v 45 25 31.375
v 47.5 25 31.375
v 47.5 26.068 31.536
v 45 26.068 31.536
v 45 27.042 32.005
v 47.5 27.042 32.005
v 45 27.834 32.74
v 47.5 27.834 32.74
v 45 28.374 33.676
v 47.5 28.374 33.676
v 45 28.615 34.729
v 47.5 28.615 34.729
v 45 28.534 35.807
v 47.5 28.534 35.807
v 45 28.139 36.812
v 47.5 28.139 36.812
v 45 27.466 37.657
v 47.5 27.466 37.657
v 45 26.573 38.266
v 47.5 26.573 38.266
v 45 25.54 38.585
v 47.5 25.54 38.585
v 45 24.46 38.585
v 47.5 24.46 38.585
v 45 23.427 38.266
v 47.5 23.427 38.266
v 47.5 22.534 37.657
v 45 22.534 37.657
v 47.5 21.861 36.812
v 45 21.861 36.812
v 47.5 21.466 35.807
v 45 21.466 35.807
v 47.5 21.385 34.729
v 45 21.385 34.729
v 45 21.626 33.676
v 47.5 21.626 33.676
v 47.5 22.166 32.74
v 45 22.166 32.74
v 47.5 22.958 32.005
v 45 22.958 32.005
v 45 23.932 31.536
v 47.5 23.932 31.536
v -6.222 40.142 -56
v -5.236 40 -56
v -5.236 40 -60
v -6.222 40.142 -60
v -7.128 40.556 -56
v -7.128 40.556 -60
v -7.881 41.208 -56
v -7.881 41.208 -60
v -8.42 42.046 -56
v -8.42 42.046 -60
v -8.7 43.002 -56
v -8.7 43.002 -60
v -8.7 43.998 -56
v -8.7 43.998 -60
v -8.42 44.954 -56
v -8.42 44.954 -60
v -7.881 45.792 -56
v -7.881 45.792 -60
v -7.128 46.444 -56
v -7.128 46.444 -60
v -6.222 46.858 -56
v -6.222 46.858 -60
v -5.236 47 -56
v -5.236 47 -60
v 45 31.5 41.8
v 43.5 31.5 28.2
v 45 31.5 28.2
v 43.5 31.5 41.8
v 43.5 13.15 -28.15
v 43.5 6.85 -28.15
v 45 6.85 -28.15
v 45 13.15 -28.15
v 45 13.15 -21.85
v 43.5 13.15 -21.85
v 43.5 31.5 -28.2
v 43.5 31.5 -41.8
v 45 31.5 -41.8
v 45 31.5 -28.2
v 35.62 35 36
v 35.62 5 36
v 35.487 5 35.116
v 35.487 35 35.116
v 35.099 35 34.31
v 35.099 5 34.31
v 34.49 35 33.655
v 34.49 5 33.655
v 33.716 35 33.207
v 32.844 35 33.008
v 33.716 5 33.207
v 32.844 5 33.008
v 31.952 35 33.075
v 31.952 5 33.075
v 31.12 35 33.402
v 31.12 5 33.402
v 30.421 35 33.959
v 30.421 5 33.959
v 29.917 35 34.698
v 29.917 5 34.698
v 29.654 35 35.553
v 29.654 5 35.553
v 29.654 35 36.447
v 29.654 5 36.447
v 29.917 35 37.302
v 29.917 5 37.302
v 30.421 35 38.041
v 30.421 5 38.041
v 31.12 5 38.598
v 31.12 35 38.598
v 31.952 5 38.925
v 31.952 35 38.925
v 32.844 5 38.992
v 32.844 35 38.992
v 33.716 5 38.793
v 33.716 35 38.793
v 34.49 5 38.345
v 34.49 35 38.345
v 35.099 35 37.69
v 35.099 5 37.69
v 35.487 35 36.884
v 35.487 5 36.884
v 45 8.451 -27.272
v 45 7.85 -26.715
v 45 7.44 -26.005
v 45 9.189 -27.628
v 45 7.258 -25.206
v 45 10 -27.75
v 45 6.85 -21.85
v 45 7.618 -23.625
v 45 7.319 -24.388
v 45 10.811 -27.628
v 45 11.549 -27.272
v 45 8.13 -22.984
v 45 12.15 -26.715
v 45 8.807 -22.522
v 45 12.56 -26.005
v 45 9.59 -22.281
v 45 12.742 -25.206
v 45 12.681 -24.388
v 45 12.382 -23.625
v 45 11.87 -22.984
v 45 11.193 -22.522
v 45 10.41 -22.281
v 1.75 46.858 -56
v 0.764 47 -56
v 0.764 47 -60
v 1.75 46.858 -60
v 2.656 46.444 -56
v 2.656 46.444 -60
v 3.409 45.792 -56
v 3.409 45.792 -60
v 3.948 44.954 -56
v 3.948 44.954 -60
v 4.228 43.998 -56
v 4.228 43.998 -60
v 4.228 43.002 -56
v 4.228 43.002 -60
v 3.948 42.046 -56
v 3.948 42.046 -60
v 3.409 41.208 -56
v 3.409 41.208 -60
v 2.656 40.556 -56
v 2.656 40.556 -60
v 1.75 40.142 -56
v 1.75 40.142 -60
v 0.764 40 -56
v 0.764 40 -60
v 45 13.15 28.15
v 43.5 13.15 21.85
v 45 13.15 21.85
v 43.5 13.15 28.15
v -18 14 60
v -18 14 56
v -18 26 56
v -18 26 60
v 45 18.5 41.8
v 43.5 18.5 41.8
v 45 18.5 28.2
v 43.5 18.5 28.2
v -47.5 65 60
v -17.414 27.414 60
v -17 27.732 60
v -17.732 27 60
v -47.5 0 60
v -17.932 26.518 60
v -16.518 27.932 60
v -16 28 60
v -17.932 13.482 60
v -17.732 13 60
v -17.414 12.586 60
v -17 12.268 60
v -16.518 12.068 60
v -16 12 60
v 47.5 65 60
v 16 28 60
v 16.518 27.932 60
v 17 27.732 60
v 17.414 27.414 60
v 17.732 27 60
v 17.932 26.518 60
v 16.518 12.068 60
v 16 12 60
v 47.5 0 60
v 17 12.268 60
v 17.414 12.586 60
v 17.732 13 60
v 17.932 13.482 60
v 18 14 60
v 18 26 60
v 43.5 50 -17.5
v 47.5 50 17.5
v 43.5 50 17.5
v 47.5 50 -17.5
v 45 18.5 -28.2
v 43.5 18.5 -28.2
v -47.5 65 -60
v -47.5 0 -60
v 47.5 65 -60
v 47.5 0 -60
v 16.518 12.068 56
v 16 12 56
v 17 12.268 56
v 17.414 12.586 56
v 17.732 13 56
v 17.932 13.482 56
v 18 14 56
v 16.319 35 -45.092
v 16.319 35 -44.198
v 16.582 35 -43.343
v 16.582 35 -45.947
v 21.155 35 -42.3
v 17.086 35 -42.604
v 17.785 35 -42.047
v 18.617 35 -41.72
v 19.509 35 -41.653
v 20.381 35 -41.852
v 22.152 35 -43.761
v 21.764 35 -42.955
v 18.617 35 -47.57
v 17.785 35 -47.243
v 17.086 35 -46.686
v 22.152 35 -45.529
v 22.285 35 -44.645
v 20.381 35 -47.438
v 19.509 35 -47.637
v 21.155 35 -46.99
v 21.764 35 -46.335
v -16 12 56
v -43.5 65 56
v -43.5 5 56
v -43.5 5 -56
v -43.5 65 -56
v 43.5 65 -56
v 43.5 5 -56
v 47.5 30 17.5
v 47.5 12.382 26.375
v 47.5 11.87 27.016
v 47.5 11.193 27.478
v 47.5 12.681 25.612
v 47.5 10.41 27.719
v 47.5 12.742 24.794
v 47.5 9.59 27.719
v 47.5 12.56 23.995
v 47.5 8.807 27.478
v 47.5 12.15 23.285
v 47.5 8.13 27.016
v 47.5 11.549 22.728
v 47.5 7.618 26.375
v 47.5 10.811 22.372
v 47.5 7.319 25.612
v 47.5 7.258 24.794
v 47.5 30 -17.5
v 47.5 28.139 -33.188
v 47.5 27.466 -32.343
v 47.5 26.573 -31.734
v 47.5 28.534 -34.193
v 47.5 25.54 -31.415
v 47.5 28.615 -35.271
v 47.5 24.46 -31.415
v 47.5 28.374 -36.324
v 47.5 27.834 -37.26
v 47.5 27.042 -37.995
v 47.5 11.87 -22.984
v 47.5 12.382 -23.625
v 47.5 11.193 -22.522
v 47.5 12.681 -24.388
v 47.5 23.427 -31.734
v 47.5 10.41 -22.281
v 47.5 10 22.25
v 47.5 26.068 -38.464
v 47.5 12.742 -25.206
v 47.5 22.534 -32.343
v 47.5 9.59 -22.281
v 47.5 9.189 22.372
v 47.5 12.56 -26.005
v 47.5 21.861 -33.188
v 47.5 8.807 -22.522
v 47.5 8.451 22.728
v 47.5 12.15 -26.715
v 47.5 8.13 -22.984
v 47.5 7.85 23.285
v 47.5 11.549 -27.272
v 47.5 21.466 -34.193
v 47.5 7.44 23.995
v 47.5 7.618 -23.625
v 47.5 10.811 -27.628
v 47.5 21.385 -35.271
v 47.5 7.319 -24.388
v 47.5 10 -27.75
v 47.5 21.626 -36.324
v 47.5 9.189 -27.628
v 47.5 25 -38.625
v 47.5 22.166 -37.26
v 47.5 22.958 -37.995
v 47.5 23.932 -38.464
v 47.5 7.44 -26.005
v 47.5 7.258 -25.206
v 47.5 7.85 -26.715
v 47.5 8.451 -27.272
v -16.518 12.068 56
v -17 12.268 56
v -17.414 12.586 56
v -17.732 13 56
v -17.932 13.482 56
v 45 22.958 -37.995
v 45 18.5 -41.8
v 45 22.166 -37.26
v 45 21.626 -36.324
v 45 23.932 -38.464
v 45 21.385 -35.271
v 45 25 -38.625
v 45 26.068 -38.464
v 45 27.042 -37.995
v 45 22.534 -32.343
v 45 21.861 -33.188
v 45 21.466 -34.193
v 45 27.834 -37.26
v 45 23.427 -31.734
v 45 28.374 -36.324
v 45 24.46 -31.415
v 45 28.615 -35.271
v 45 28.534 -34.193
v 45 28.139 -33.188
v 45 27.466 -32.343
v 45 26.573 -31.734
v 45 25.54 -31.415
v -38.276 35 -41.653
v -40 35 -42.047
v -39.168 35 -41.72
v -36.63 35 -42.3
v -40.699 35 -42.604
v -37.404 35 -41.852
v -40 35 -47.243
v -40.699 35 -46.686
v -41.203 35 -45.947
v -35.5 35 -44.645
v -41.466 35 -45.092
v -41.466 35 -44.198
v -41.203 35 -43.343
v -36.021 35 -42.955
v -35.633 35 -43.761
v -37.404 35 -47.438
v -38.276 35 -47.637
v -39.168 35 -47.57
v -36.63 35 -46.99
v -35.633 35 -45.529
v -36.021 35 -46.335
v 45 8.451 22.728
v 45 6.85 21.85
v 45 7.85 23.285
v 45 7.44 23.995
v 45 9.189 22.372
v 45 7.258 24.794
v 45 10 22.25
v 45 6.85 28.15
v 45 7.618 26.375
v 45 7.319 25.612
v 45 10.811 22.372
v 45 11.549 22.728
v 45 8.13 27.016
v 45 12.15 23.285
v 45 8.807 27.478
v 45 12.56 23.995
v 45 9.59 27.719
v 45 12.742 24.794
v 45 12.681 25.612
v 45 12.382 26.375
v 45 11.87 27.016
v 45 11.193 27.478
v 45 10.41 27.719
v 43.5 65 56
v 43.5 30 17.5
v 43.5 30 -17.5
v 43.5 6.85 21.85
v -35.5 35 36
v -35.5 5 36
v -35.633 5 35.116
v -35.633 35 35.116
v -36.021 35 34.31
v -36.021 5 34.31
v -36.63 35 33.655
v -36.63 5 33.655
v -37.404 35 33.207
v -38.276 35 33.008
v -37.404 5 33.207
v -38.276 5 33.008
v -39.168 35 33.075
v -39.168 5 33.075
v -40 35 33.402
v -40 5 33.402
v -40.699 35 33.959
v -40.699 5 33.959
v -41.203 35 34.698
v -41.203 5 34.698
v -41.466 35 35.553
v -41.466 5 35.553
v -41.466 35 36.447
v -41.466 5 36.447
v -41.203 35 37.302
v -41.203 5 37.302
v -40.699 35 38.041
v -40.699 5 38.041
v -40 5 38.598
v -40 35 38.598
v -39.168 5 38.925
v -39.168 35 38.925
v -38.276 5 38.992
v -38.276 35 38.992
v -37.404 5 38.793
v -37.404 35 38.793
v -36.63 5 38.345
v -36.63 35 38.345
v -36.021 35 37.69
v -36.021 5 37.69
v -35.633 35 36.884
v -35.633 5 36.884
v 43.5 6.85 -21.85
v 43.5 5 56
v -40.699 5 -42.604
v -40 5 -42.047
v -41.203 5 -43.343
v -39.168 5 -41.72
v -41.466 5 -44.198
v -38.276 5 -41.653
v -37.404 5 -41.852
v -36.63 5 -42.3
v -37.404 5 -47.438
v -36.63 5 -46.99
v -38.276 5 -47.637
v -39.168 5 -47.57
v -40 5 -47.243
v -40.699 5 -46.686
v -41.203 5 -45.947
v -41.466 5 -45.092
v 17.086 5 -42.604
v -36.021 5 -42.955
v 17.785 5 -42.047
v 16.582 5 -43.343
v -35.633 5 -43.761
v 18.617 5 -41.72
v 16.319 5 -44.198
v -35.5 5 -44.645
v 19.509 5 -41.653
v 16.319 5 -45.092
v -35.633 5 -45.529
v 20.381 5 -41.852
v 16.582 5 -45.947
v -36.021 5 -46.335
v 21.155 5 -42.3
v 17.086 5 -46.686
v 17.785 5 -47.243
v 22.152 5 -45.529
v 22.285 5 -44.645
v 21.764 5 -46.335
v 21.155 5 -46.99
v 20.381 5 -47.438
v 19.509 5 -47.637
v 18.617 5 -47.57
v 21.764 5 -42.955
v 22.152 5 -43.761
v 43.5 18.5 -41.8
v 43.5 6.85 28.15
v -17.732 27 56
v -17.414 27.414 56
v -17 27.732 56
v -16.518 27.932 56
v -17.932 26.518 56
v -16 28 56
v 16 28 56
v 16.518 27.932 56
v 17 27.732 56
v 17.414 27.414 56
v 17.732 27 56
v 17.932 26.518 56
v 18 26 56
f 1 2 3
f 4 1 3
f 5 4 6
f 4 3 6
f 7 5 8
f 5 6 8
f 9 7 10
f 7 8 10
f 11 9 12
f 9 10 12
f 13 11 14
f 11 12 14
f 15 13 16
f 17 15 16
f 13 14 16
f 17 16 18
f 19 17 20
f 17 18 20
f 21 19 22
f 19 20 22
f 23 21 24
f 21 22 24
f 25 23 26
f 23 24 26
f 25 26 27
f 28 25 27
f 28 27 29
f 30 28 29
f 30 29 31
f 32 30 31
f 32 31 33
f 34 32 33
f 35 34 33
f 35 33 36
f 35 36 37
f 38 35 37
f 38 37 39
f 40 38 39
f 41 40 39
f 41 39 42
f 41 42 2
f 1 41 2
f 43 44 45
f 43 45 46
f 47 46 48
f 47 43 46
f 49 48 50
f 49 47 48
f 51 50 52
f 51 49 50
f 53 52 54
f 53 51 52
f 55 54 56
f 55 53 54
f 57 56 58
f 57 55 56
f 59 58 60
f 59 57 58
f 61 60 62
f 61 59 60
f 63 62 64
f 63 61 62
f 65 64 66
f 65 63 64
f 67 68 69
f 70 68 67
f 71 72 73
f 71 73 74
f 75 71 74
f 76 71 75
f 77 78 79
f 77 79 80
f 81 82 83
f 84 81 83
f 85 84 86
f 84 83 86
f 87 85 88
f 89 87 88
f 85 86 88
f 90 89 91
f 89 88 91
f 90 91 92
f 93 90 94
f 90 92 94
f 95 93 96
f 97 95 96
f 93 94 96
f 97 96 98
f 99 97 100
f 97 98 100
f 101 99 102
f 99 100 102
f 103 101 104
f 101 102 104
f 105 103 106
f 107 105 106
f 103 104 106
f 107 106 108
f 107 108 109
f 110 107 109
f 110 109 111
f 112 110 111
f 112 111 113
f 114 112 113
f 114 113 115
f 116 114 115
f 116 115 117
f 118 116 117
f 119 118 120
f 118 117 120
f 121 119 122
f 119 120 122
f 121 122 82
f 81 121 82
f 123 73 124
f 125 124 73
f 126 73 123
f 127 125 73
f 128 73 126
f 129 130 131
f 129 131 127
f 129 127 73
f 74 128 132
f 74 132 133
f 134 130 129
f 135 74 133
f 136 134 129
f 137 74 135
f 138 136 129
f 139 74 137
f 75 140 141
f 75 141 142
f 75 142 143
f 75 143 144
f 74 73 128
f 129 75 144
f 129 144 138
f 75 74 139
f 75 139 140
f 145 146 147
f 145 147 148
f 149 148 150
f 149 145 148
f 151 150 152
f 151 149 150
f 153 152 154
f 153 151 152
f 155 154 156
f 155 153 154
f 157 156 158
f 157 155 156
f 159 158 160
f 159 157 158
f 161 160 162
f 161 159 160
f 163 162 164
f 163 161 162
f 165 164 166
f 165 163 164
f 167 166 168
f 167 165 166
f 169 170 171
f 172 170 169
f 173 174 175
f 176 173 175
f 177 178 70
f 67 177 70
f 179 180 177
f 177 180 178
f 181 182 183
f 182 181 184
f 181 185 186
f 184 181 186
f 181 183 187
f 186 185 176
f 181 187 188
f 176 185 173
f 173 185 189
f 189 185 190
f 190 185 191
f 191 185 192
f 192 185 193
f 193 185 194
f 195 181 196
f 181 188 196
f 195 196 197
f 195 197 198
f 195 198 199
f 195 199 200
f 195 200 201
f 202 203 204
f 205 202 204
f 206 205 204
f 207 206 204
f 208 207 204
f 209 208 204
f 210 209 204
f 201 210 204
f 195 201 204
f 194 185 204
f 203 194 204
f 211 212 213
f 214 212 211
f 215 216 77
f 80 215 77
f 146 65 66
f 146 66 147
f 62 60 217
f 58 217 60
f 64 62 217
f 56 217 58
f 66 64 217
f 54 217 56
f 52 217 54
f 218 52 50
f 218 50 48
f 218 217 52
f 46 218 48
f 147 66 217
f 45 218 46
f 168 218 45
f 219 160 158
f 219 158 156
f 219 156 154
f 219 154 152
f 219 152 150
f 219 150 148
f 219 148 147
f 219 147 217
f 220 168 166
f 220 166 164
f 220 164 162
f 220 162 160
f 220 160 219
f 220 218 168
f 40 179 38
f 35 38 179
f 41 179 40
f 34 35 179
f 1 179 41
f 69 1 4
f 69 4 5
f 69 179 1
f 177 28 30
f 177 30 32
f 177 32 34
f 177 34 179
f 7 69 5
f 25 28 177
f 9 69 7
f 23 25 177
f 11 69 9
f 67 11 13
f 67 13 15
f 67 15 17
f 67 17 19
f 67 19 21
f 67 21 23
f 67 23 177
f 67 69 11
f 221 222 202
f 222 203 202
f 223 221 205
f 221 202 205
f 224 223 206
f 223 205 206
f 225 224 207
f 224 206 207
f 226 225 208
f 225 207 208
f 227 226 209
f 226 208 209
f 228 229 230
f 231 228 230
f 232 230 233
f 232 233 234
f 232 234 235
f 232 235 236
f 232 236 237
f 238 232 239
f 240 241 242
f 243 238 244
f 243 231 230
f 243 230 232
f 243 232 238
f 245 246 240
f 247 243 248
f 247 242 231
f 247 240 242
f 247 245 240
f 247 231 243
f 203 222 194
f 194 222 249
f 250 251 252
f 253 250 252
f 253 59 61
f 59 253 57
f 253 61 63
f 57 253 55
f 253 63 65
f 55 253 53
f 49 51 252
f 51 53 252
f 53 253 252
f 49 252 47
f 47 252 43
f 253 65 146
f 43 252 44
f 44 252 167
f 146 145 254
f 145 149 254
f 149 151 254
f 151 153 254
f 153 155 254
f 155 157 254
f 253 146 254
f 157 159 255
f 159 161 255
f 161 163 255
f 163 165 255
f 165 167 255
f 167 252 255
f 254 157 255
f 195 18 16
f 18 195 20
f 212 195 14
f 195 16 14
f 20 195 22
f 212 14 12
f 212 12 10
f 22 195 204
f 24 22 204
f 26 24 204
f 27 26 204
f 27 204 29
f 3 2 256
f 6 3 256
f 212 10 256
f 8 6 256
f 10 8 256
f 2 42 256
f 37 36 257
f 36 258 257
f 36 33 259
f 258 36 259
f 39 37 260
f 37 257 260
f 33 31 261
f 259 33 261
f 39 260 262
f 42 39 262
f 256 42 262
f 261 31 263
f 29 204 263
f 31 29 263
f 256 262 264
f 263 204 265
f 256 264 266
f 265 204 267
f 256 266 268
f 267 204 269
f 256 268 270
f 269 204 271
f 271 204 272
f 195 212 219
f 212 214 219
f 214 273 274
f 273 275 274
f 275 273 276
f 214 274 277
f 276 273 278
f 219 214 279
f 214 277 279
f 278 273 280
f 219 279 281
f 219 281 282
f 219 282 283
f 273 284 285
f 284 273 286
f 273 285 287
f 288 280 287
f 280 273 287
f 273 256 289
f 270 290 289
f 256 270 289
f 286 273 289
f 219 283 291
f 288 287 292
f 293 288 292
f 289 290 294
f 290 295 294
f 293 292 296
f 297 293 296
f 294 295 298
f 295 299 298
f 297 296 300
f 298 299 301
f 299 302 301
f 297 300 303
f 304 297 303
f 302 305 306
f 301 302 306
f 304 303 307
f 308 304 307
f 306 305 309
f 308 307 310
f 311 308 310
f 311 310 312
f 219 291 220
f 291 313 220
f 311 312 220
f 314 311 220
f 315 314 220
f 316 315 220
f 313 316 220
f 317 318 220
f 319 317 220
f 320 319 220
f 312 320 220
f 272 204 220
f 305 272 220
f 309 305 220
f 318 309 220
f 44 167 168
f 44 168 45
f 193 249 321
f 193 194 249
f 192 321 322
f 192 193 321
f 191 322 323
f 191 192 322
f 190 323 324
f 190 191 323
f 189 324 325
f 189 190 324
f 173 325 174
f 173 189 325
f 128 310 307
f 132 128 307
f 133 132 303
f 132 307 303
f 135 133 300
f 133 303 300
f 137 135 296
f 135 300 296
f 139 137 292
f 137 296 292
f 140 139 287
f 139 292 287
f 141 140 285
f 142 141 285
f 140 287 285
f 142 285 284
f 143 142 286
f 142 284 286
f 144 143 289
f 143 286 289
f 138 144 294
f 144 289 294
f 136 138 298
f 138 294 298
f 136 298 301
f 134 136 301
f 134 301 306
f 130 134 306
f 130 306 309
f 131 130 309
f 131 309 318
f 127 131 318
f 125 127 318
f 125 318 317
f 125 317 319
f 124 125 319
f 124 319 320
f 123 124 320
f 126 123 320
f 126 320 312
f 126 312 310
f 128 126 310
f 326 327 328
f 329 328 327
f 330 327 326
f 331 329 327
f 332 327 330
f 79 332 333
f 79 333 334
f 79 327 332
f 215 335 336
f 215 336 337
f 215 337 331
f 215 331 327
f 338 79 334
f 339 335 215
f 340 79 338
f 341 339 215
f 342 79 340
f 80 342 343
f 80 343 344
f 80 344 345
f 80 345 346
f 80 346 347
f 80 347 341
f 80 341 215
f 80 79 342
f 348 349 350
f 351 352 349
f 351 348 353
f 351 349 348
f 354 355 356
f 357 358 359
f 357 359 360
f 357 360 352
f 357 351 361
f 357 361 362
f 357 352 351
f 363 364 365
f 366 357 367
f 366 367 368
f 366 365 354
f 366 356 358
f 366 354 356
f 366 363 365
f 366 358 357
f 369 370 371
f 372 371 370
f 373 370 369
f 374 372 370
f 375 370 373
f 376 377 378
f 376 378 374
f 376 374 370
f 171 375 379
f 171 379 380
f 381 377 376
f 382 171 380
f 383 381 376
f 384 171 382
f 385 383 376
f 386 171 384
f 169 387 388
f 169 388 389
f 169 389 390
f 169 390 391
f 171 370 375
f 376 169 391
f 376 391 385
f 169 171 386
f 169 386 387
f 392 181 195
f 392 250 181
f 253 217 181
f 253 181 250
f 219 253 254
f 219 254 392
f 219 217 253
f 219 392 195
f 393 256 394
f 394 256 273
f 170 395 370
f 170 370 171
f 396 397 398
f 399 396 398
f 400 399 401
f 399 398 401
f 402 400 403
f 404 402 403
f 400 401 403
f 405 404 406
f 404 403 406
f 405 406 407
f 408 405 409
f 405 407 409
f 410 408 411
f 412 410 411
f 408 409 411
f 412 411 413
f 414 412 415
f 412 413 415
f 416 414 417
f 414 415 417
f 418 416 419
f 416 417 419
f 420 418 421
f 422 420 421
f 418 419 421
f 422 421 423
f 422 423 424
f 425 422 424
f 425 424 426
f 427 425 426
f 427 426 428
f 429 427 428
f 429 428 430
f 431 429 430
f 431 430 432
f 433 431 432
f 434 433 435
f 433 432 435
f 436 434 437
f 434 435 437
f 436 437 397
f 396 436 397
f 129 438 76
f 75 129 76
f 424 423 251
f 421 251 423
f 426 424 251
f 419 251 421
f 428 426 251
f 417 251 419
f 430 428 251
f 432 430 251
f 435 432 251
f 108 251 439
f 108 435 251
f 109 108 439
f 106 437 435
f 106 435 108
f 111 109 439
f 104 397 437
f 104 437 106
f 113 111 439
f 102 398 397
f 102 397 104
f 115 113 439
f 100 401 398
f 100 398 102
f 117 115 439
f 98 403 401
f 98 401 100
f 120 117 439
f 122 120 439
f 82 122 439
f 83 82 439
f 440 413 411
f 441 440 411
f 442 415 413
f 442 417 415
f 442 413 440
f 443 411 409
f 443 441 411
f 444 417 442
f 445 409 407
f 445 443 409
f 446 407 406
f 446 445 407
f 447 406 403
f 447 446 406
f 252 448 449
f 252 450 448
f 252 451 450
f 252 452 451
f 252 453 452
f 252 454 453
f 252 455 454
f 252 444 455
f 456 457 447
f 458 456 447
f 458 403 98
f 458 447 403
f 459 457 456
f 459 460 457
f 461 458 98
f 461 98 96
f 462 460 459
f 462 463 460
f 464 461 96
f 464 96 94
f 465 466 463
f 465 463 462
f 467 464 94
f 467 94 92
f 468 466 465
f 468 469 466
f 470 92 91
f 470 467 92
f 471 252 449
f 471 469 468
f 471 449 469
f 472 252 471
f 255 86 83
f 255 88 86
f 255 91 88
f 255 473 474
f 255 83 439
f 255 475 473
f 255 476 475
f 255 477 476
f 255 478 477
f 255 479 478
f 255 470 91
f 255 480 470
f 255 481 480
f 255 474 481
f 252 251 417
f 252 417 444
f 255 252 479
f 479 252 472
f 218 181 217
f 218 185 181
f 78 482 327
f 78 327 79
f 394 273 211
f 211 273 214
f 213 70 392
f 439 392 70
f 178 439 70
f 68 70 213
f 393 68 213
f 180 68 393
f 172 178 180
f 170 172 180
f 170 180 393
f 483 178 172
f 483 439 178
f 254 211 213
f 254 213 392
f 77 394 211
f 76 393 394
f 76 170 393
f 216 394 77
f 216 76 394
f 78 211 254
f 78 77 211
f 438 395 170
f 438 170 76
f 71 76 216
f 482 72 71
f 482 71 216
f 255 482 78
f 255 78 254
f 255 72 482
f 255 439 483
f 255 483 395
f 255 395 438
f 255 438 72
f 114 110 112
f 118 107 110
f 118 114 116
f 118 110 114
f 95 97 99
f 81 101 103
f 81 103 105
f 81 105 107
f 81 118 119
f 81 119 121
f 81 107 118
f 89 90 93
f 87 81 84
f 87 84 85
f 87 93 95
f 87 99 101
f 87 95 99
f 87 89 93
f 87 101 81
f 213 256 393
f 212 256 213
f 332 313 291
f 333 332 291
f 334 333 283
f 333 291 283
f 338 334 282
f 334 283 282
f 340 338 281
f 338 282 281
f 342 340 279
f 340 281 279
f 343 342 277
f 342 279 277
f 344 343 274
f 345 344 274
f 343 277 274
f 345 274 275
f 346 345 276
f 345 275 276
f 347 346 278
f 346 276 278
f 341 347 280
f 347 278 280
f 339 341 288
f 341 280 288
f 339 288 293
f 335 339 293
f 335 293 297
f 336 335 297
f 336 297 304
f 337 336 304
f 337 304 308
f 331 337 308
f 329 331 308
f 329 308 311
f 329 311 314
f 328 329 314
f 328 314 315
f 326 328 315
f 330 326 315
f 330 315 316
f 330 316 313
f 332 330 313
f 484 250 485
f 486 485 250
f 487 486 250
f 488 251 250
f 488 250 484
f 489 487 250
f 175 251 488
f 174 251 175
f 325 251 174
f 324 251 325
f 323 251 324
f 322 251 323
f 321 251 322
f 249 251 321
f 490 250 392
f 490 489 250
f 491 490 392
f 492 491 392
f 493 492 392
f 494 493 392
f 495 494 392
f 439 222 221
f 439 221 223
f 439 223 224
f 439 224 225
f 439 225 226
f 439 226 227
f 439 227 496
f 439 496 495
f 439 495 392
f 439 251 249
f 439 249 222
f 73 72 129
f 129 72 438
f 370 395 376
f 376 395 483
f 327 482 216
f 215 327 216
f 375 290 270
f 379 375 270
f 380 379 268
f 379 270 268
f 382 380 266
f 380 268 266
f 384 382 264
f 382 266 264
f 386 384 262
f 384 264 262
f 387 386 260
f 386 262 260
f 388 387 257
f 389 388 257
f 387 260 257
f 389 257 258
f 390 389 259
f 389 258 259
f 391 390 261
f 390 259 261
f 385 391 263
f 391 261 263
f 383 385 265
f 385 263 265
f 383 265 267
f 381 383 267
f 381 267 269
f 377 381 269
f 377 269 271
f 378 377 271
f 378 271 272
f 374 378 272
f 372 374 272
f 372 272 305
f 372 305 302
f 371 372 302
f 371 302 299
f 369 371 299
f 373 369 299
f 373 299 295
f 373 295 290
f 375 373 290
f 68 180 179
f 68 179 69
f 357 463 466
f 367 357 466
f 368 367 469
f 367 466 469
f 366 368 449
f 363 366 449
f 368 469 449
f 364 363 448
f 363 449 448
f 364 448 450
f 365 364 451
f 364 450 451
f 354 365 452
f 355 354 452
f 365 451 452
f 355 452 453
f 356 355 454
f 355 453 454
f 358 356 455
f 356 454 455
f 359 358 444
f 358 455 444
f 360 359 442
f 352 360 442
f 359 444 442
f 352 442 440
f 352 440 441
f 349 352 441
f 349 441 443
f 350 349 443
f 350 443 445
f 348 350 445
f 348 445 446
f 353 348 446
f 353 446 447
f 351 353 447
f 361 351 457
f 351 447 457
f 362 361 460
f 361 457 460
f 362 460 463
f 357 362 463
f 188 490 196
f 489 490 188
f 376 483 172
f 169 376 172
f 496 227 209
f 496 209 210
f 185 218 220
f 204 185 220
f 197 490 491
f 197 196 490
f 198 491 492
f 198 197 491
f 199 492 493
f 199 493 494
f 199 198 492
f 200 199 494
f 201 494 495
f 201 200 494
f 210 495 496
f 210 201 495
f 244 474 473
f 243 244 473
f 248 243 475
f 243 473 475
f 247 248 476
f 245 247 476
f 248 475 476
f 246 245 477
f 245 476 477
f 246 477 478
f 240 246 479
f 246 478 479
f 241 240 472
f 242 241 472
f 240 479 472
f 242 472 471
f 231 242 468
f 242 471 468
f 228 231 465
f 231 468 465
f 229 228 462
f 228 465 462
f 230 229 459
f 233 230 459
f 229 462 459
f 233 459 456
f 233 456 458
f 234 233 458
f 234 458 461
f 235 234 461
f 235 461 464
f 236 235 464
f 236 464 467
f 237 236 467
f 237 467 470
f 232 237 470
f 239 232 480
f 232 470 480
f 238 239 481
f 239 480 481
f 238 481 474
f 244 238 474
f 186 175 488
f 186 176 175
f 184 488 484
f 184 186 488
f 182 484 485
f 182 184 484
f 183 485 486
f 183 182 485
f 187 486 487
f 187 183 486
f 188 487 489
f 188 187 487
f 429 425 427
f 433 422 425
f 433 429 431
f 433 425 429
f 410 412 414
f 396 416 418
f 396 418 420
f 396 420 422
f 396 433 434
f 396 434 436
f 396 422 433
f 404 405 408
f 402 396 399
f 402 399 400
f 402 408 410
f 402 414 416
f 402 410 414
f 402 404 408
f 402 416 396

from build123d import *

# Parameters (mm, degrees)
SKETCH1_W                   = 95
SKETCH1_H                   = 120
BASE_DIMENSIONS_DEPTH       = 5
SKETCH2_W                   = 95
SKETCH2_H                   = 120
SKETCH2_W_2                 = 87
SKETCH2_H_2                 = 112
WALL_HEIGHT_AND_DEPTH_DEPTH = 60
SKETCH3_R                   = 3
SUPPORT_PEGS_DEPTH          = 30
SKETCH4_R                   = 3.625
SKETCH4_R_2                 = 2.75
SKETCH4_W                   = 35
SKETCH4_H                   = 20
FRONT_HOLES_DEPTH           = 4
SKETCH6_W                   = 13.6
SKETCH6_H                   = 13
SKETCH6_W_2                 = 6.3
SKETCH6_H_2                 = 6.3
EN_AND_B_INLAY_DEPTH        = 1.5
USB_SLOT_DEPTH              = 5
SKETCH10_W                  = 36
SKETCH10_H                  = 16
CUT_EXTRUDE1_DEPTH          = 10
FILLET1_R                   = 2


with BuildPart() as part:
    # Sketch1 → base dimensions (new body)
    with BuildSketch(Plane(origin=(0, 0, 0), x_dir=(1, 0, 0), z_dir=(0, 1, 0))):
        Rectangle(SKETCH1_W, SKETCH1_H)
    extrude(amount=BASE_DIMENSIONS_DEPTH)

    # Sketch2 → wall height and depth (add)
    with BuildSketch(Plane(origin=(0, 5, 0), x_dir=(1, 0, 0), z_dir=(0, 1, 0))):
        Rectangle(SKETCH2_W, SKETCH2_H)
        Rectangle(SKETCH2_W_2, SKETCH2_H_2, mode=Mode.SUBTRACT)
    extrude(amount=WALL_HEIGHT_AND_DEPTH_DEPTH)

    # Sketch3 → support pegs (add)
    with BuildSketch(Plane(origin=(0, 5, 0), x_dir=(1, 0, 0), z_dir=(0, 1, 0))):
        with Locations((-38.5, 44.645)):
            Circle(SKETCH3_R)
        with Locations((-38.5, -36)):
            Circle(SKETCH3_R)
        with Locations((32.62, -36)):
            Circle(SKETCH3_R)
        with Locations((19.285, 44.645)):
            Circle(SKETCH3_R)
    extrude(amount=SUPPORT_PEGS_DEPTH)

    # Sketch4 → front holes (cut)
    with BuildSketch(Plane(origin=(47.5, 0, 0), x_dir=(0, 0, -1), z_dir=(1, 0, 0))):
        with Locations((-35, 25)):
            Circle(SKETCH4_R)
        with Locations((-25, 10)):
            Circle(SKETCH4_R_2)
        with Locations((25, 10)):
            Circle(SKETCH4_R_2)
        with Locations((35, 25)):
            Circle(SKETCH4_R)
        with Locations((0, 40)):
            Rectangle(SKETCH4_W, SKETCH4_H)
    extrude(amount=-FRONT_HOLES_DEPTH, mode=Mode.SUBTRACT)

    # Sketch6 → en and b inlay (cut)
    with BuildSketch(Plane.ZY.offset(-43.5)):
        with Locations((-35, 25)):
            Rectangle(SKETCH6_W, SKETCH6_H)
        with Locations((-25, 10)):
            Rectangle(SKETCH6_W_2, SKETCH6_H_2)
        with Locations((25, 10)):
            Rectangle(SKETCH6_W_2, SKETCH6_H_2)
        with Locations((35, 25)):
            Rectangle(SKETCH6_W, SKETCH6_H)
    extrude(amount=-EN_AND_B_INLAY_DEPTH, mode=Mode.SUBTRACT)

    # Sketch9 → usb slot (cut, through all)
    with BuildSketch(Plane.XY.offset(-56)):
        with BuildLine():
            Line((-5.236035164, 47), (0.763964836, 47))
            ThreePointArc((0.763964836, 47), (4.263964836, 43.5), (0.763964836, 40))
            Line((0.763964836, 40), (-5.236035164, 40))
            ThreePointArc((-5.236035164, 40), (-8.736035164, 43.5), (-5.236035164, 47))
        make_face()
    extrude(amount=-USB_SLOT_DEPTH, mode=Mode.SUBTRACT)

    # Sketch10 → Cut-Extrude1 (cut)
    with BuildSketch(Plane(origin=(0, 0, 56), x_dir=(-1, 0, 0), z_dir=(0, 0, -1))):
        with Locations((0, 20)):
            Rectangle(SKETCH10_W, SKETCH10_H)
    extrude(amount=-CUT_EXTRUDE1_DEPTH, mode=Mode.SUBTRACT)

    # Fillet1
    fillet1_edges = [part.edges().sort_by_distance(p)[0] for p in [
        (-18, 28, 58),
        (-18, 12, 58),
        (18, 12, 58),
        (18, 28, 58),
    ]]
    fillet(fillet1_edges, radius=FILLET1_R)


solid = part.part
